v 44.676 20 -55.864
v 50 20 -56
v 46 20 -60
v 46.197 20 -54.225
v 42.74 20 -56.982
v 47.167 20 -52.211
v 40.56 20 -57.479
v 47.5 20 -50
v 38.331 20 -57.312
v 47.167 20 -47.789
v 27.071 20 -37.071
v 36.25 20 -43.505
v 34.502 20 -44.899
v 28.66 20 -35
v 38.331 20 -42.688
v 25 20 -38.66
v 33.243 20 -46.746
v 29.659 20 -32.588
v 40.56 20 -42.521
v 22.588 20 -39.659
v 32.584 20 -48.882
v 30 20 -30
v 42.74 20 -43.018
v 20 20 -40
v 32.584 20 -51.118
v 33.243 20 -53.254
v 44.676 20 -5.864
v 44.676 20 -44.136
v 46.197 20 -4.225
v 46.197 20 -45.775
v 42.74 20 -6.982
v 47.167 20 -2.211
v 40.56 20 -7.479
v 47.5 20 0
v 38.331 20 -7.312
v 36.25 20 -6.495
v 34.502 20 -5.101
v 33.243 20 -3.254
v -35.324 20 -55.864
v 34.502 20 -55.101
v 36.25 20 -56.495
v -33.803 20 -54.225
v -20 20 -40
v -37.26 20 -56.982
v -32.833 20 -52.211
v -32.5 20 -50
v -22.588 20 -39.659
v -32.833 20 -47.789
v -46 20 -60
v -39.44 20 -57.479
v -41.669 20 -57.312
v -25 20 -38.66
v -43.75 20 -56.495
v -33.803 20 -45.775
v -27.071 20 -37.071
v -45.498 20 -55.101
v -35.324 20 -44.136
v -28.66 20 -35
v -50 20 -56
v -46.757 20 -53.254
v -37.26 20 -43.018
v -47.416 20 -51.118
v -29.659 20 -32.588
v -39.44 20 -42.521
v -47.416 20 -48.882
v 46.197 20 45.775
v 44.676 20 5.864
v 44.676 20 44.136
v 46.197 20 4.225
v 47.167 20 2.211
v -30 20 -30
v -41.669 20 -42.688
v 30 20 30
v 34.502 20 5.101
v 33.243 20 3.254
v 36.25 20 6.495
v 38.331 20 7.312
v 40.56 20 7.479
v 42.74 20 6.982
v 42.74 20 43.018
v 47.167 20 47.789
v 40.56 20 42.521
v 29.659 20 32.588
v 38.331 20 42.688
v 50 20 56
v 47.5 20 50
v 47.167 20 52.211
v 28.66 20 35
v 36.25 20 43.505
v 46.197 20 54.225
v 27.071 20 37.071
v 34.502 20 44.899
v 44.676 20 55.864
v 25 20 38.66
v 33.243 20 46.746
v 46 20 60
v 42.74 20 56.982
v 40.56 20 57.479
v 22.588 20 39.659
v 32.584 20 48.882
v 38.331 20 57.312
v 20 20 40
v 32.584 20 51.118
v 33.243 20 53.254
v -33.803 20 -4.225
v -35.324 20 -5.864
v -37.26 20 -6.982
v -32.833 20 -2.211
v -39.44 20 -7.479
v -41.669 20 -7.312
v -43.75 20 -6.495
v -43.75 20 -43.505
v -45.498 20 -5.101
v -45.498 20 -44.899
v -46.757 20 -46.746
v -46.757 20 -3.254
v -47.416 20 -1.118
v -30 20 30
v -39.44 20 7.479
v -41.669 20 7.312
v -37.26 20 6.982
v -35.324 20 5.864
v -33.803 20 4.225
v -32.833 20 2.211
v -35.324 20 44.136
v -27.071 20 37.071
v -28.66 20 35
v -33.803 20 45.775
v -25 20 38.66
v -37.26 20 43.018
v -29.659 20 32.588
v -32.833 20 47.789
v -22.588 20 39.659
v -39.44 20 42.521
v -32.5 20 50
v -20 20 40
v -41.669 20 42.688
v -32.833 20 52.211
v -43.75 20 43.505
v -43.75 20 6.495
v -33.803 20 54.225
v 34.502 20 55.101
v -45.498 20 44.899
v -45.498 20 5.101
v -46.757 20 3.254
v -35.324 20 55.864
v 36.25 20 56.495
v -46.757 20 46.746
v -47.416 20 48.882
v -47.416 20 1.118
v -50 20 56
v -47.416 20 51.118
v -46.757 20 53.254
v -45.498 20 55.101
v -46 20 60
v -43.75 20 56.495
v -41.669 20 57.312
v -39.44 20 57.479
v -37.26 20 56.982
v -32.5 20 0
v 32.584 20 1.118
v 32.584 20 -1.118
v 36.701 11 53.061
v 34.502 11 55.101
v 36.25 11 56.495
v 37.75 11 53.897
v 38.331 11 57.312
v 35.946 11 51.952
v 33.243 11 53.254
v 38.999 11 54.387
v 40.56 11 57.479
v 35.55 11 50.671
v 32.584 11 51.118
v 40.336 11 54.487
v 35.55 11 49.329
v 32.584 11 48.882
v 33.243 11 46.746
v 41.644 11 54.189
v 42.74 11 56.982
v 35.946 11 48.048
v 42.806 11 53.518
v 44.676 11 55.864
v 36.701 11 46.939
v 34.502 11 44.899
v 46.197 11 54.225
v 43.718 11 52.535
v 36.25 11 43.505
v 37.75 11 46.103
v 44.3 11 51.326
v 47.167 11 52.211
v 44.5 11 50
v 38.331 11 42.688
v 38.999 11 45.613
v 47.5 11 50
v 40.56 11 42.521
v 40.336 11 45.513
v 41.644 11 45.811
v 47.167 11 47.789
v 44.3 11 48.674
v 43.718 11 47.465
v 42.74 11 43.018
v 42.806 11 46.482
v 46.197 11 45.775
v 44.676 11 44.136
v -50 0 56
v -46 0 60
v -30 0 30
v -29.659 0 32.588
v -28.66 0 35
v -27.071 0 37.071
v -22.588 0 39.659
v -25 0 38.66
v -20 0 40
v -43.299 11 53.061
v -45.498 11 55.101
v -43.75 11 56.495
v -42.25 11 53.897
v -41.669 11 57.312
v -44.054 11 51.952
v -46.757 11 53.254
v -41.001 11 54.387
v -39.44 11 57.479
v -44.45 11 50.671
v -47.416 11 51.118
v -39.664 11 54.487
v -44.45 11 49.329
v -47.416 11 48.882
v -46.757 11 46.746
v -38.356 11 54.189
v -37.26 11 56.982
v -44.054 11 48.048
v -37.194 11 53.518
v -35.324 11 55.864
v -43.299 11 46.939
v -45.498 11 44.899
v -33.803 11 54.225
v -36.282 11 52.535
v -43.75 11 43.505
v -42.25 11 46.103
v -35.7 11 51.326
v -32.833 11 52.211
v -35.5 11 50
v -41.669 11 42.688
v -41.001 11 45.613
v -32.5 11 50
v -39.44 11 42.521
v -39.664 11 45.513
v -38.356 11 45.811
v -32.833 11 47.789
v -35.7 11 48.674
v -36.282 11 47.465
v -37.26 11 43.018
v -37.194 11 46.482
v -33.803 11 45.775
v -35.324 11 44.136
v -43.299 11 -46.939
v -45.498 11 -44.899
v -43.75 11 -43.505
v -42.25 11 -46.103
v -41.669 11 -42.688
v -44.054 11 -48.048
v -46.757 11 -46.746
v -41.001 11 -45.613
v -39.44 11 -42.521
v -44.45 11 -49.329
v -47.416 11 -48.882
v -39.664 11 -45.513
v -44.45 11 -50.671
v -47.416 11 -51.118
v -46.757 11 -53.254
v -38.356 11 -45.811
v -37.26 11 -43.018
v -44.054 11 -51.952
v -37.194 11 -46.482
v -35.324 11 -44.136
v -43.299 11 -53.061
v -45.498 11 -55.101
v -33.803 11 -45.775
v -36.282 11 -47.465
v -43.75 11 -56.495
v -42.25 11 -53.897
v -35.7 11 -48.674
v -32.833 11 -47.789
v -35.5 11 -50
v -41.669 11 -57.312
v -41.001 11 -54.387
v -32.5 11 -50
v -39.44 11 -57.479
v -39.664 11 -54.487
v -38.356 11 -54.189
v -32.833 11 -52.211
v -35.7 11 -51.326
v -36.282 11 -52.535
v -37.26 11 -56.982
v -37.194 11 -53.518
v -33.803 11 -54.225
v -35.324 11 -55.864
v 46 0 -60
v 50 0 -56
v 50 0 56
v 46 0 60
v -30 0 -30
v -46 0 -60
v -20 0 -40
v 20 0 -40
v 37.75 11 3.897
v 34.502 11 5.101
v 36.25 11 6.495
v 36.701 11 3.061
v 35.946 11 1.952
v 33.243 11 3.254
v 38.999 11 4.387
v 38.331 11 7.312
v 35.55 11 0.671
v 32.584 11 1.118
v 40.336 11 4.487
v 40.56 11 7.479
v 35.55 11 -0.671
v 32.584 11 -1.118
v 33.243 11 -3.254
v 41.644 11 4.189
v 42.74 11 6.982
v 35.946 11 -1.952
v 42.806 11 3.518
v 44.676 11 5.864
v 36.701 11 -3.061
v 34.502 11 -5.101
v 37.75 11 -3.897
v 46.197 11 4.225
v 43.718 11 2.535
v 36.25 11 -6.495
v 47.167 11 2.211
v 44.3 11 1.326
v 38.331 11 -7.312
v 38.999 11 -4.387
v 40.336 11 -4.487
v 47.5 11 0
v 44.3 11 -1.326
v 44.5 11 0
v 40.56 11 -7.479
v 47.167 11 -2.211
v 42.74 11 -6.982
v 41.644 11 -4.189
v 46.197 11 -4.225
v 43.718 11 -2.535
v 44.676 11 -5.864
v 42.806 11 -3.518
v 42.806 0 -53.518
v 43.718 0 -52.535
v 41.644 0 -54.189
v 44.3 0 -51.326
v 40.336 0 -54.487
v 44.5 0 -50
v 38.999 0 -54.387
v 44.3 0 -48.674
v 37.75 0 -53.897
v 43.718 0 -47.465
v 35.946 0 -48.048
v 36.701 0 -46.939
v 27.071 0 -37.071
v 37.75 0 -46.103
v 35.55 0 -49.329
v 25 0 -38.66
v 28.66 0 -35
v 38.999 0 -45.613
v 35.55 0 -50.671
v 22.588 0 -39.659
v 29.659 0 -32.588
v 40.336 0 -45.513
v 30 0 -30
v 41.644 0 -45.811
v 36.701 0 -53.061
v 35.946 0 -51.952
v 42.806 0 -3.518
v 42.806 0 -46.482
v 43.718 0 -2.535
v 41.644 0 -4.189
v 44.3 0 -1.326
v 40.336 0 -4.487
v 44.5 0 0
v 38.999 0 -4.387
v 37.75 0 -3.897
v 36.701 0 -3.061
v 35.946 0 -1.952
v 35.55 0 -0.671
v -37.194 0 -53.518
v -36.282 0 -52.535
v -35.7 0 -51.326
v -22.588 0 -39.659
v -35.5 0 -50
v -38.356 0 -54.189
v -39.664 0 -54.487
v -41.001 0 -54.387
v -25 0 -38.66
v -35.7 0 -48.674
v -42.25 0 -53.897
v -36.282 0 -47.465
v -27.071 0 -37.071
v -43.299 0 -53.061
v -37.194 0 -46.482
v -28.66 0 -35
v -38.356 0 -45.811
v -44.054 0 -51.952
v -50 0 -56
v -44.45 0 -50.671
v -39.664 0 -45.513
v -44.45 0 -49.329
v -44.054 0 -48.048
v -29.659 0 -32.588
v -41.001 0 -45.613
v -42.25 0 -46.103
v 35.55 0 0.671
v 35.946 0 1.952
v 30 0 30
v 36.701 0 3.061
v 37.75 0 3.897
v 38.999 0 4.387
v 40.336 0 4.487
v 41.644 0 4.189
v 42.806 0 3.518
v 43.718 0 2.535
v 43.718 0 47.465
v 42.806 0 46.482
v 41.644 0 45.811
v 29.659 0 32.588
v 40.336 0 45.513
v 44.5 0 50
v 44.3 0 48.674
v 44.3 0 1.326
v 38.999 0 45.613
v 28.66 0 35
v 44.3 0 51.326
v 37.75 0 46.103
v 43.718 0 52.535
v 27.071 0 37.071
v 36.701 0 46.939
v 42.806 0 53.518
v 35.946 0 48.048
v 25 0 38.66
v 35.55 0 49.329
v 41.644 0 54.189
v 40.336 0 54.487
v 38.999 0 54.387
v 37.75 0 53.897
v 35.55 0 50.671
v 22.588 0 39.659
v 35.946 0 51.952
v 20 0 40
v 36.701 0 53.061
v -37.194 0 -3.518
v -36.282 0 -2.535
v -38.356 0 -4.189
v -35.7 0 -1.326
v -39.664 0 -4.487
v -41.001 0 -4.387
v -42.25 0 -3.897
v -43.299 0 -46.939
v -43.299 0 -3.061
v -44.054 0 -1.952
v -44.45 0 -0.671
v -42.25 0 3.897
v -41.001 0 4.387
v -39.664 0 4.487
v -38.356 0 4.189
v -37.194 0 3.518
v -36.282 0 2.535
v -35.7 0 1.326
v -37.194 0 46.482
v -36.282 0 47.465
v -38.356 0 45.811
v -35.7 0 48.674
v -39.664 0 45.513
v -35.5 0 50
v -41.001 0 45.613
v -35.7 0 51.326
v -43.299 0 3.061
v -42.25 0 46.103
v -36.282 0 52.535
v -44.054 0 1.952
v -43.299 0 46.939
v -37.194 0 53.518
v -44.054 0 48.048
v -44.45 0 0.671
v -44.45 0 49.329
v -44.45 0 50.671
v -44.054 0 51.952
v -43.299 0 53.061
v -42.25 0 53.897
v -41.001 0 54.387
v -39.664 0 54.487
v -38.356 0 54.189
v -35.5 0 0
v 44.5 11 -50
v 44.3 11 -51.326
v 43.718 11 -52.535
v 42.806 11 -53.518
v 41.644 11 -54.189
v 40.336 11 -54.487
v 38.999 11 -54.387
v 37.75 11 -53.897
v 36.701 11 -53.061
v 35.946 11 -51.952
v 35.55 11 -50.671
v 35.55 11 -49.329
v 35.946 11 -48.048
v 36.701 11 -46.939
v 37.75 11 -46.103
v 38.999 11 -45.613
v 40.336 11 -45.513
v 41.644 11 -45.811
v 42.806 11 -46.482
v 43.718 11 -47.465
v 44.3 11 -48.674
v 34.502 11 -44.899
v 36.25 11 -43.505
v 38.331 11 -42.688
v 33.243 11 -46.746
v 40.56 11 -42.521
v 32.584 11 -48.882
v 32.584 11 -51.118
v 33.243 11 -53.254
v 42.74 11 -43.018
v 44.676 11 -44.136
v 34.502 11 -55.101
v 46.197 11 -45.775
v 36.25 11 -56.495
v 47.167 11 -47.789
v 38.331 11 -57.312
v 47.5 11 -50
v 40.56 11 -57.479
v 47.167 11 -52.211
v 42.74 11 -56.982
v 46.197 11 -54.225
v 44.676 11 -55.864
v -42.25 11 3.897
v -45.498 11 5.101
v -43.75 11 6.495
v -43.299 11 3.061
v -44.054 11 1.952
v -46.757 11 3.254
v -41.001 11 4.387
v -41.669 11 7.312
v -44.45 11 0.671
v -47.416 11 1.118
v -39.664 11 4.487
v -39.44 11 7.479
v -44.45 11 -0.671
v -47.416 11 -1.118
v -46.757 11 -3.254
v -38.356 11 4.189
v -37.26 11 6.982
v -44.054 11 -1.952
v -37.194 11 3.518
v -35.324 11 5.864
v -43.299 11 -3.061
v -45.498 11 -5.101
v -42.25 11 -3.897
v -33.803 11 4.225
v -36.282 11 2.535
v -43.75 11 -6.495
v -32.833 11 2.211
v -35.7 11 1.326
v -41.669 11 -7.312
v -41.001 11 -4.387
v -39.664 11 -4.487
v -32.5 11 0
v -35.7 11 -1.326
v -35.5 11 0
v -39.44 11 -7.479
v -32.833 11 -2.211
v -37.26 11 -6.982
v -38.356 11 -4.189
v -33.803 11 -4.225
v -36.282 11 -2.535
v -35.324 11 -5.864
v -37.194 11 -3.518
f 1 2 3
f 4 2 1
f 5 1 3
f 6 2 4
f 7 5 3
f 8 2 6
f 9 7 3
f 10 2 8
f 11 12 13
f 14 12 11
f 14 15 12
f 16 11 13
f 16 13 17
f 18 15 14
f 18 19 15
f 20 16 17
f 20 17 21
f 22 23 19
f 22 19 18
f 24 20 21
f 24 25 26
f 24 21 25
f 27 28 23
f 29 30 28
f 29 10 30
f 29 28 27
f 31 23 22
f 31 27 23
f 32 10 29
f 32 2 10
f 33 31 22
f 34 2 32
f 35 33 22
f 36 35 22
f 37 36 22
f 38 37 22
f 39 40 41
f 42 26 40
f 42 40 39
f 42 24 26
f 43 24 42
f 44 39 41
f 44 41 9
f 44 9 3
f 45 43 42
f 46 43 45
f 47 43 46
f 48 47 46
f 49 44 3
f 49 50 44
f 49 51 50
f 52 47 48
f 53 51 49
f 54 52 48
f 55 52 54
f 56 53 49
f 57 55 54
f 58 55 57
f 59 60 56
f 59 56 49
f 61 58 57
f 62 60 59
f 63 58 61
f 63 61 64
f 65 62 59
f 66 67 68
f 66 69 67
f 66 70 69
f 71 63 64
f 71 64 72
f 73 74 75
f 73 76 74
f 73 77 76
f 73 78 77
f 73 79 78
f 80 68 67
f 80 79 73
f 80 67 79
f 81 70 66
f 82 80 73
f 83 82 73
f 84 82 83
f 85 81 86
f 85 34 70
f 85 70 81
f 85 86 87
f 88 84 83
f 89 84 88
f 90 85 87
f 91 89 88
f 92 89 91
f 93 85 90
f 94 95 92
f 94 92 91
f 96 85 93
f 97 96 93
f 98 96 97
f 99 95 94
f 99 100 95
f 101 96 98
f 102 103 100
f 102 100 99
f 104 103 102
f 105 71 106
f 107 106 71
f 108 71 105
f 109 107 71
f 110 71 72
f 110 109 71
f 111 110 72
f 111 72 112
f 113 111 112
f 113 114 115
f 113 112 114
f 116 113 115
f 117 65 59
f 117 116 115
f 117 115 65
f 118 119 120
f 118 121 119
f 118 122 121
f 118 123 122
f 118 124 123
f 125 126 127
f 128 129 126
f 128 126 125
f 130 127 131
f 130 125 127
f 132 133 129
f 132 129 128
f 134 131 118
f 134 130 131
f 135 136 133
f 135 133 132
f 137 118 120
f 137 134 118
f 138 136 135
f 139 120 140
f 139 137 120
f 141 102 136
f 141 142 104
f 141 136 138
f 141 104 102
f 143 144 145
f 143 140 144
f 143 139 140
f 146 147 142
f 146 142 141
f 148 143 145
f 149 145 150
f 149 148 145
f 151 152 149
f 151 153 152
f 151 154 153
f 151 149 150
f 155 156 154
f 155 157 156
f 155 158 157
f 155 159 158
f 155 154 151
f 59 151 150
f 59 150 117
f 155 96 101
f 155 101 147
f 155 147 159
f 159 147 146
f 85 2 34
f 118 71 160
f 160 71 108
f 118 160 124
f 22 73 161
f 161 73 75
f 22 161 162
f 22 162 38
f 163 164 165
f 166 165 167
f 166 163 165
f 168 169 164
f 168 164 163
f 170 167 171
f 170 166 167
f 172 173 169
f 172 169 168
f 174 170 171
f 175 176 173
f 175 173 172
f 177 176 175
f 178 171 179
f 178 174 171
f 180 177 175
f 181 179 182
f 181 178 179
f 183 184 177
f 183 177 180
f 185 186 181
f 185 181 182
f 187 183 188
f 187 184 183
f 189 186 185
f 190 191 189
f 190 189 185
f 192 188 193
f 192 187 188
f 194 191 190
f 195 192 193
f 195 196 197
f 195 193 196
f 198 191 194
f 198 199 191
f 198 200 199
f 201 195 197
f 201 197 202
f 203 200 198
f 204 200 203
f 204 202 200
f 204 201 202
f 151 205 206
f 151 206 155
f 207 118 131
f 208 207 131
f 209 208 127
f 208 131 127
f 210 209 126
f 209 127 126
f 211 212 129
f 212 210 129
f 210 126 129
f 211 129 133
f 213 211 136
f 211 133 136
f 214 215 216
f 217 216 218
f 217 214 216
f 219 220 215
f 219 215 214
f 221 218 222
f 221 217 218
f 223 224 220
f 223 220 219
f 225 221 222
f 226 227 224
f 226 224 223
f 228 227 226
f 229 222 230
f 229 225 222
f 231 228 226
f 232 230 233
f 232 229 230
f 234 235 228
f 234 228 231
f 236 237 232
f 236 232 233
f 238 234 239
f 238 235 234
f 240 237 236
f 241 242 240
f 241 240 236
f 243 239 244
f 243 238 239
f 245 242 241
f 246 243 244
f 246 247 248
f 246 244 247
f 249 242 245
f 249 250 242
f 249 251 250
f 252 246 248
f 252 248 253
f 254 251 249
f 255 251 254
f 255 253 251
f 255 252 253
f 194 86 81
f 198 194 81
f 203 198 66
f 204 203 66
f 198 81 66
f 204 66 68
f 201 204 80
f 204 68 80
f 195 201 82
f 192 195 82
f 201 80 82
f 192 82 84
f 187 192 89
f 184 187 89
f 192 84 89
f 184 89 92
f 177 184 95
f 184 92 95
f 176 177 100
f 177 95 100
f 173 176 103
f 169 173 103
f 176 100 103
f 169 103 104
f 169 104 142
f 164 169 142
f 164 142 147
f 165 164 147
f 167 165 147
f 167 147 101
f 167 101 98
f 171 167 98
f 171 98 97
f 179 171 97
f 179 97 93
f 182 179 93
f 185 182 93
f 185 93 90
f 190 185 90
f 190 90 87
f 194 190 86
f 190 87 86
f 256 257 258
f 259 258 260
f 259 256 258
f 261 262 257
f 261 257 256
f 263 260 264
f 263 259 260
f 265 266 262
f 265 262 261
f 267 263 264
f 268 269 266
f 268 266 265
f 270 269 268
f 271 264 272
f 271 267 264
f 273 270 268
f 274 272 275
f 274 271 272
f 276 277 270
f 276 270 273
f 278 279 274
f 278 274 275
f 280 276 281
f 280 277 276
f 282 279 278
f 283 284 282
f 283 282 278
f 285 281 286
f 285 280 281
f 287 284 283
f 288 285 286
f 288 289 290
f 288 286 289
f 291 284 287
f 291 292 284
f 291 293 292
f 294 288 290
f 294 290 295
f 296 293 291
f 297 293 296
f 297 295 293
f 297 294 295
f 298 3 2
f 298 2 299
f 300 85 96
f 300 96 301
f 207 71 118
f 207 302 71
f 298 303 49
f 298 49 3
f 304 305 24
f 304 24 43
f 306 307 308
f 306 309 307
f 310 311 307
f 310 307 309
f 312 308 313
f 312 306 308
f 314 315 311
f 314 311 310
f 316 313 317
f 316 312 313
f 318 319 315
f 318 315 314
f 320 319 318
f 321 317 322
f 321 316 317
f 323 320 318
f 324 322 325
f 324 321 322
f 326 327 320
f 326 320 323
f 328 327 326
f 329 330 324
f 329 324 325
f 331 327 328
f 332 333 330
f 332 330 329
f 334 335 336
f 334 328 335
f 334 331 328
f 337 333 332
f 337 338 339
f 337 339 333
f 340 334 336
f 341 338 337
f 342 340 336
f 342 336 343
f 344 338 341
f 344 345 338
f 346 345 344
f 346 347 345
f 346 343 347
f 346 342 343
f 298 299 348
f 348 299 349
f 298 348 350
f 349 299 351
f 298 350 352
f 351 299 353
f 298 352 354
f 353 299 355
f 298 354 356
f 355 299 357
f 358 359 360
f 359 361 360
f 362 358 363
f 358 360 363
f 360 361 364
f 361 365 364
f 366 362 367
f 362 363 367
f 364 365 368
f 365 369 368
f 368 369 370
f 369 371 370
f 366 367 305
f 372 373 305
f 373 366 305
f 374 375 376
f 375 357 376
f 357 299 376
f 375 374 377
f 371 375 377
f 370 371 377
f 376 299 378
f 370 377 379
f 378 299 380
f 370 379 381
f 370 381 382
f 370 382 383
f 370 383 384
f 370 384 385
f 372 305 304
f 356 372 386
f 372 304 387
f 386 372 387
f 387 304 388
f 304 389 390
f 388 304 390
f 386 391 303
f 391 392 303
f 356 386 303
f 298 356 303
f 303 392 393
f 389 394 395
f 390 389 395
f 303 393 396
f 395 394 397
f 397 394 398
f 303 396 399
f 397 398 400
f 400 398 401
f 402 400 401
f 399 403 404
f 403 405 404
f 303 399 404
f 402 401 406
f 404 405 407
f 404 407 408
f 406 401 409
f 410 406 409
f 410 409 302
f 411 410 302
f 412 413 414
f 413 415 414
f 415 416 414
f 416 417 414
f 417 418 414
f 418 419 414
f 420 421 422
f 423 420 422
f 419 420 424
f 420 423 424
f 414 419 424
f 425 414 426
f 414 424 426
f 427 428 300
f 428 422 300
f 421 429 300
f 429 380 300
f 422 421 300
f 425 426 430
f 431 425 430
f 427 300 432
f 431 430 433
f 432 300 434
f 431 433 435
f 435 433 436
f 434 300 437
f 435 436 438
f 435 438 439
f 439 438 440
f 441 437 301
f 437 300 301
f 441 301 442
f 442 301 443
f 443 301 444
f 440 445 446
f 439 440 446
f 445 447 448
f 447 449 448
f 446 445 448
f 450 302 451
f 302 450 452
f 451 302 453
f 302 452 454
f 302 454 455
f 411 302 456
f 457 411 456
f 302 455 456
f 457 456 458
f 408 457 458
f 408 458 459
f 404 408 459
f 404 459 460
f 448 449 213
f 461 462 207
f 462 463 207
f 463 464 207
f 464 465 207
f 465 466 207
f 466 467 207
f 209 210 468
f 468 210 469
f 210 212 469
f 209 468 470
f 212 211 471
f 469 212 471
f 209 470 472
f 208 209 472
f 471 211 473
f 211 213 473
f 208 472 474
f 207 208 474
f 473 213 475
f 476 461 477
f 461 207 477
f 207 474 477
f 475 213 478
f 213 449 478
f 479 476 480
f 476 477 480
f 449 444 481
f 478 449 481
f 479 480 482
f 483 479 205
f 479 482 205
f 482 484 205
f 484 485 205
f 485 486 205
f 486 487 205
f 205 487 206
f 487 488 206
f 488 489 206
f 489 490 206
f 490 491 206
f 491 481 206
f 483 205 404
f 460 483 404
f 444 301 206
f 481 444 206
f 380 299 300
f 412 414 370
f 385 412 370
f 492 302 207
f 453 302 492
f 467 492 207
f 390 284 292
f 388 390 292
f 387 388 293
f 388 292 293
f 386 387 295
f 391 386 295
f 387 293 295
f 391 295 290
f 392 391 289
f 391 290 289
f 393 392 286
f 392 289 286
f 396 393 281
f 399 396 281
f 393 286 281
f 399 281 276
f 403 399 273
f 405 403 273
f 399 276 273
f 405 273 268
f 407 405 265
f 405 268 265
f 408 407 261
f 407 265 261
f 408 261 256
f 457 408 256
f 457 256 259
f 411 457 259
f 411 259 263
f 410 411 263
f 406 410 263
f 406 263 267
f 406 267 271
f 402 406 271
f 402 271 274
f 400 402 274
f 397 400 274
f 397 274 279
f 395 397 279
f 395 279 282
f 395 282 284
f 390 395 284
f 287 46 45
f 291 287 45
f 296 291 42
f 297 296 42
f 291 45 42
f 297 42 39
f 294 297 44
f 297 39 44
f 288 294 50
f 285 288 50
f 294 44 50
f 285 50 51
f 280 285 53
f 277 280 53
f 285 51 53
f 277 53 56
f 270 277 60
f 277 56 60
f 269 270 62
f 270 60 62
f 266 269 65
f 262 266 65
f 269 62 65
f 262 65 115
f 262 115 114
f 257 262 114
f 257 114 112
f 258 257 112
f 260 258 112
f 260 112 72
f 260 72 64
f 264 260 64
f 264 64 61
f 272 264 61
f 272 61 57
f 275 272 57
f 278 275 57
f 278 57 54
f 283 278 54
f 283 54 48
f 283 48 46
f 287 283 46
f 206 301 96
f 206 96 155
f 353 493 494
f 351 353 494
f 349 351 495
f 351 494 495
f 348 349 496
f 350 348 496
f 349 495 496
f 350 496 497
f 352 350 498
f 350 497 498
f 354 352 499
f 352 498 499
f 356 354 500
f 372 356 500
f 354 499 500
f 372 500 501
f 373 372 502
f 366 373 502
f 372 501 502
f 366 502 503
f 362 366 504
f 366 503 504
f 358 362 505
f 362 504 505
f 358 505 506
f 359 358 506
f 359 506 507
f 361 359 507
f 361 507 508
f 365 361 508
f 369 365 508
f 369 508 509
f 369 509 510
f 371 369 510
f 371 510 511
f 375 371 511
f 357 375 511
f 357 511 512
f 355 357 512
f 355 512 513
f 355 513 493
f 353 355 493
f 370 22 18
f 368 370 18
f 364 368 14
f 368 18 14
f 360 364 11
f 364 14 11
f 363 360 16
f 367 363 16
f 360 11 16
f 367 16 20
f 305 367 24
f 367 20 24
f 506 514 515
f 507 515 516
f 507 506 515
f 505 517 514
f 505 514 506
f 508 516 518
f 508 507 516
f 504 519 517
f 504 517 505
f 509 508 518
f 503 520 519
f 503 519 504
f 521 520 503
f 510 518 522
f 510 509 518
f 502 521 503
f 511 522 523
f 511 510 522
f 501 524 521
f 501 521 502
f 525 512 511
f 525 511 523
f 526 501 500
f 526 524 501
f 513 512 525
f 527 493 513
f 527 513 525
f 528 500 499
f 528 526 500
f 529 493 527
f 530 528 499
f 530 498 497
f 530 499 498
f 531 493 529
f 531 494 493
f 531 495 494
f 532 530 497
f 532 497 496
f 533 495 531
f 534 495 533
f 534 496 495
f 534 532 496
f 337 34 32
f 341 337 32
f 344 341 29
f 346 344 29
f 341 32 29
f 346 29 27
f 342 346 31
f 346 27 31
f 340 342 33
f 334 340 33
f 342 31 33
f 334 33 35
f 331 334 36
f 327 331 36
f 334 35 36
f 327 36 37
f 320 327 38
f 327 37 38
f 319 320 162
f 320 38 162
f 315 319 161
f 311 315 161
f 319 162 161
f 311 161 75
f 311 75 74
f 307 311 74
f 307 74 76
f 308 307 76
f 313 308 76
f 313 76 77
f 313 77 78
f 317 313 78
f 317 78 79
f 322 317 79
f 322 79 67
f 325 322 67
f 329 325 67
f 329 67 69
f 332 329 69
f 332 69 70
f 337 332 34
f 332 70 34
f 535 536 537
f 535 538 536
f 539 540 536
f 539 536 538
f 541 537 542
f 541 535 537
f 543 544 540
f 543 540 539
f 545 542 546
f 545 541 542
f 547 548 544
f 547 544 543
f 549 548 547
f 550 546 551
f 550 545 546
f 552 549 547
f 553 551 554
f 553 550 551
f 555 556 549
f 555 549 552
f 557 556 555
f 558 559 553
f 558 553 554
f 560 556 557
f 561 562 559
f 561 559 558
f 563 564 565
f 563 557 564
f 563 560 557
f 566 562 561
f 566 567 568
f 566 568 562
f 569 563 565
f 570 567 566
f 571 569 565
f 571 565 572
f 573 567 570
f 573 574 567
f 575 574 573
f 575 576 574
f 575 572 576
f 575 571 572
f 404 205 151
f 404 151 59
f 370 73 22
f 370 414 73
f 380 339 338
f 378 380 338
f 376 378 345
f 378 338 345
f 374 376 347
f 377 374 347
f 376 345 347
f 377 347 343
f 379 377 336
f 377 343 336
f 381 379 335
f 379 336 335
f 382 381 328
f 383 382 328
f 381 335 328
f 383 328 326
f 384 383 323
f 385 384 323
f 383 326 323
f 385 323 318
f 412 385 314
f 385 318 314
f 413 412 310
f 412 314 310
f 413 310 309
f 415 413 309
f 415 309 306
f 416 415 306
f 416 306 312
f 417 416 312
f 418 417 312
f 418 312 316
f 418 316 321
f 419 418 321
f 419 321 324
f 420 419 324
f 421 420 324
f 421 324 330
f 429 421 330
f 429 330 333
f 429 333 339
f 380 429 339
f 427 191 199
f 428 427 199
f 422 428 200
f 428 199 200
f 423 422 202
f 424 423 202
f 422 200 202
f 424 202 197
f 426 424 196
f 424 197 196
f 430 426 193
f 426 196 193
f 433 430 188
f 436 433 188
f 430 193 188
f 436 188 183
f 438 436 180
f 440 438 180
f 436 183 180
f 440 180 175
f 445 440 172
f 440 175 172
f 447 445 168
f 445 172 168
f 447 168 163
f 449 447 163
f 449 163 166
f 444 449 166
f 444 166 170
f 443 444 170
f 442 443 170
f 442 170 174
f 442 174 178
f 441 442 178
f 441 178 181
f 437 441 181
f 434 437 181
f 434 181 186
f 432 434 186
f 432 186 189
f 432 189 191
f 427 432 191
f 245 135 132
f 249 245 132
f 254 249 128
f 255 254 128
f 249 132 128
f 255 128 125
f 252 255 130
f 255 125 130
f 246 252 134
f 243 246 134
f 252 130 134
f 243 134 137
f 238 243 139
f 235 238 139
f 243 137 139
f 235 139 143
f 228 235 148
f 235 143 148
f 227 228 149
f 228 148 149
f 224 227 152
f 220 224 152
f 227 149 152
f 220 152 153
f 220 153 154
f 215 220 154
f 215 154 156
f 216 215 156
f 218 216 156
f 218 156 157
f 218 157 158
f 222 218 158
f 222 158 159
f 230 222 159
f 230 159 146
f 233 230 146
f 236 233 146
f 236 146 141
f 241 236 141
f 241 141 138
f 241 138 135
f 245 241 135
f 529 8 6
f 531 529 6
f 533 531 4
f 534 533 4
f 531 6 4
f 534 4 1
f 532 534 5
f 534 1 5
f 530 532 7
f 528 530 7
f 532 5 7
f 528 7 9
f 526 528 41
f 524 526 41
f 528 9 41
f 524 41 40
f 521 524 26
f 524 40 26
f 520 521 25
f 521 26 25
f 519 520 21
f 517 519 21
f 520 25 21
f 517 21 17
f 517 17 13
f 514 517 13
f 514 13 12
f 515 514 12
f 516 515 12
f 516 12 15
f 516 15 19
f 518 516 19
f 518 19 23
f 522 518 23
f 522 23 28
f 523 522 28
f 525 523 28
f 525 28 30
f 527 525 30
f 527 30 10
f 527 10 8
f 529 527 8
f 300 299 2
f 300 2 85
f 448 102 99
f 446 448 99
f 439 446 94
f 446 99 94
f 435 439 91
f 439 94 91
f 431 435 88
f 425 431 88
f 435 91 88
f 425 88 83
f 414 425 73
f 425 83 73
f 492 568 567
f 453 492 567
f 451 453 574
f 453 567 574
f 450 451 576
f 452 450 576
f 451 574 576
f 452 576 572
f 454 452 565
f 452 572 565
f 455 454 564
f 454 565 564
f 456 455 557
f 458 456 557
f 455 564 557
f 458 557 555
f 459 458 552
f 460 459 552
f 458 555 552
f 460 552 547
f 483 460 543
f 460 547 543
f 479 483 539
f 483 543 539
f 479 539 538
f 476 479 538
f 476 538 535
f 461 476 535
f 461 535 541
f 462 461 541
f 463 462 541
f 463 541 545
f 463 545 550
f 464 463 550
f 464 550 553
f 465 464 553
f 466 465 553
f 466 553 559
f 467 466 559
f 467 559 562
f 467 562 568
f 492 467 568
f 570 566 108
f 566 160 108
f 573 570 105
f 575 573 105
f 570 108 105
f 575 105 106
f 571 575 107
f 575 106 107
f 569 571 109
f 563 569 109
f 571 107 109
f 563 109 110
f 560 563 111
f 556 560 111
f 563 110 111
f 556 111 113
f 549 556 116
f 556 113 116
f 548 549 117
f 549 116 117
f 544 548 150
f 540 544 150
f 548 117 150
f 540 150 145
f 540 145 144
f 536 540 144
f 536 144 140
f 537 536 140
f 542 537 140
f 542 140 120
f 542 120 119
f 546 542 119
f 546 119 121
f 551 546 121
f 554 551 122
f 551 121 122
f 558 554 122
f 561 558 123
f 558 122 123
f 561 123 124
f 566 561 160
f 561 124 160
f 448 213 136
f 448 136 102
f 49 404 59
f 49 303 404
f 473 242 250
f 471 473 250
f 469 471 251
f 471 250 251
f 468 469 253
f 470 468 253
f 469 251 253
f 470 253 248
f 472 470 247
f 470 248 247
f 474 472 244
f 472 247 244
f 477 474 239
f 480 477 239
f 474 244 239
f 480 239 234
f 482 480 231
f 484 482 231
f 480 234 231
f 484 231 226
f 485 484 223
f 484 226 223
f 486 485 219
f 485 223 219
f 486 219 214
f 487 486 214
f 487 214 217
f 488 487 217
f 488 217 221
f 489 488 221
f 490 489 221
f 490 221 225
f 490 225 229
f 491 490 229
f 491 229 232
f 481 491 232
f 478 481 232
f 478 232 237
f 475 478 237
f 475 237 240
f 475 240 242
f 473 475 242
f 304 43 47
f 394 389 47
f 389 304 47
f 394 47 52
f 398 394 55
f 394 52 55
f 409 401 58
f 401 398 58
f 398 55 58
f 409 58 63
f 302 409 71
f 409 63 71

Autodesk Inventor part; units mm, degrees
ref_plane "YZ Plane" through (0, 0, 0) normal (1, 0, 0) x (0, 1, 0)
ref_plane "XZ Plane" through (0, 0, 0) normal (0, 1, 0) x (-1, 0, 0)
ref_plane "XY Plane" through (0, 0, 0) normal (0, 0, 1) x (1, 0, 0)
sketch "Sketch1" plane through (0, 0, 0) normal (0, 1, 0) x (-1, 0, 0)
  line L0 (-50, 60) -> (50, 60)
  line L1 (50, 60) -> (50, -60)
  line L2 (50, -60) -> (-50, -60)
  line L3 (-50, -60) -> (-50, 60)
  line L4 (-50, 60) -> (50, -60) construction
  line L5 (50, 60) -> (-50, -60) construction
  line L6 (30, 40) -> (-30, 40)
  line L7 (-30, 40) -> (-30, -40)
  line L8 (-30, -40) -> (30, -40)
  line L9 (30, -40) -> (30, 40)
  line L10 (30, 40) -> (-30, -40) construction
  line L11 (-30, 40) -> (30, -40) construction
  point P0 (0, 0)
  dimension "d0" = 100
  dimension "d1" = 120
  dimension "d2" = 60
  dimension "d3" = 80
extrude "Extrusion1" add sketch "Sketch1" along normal blind 20
sketch "Sketch2" plane through (0, 20, 0) normal (0, 1, 0) x (1, 0, 0)
  circle A0 centre (-40, 50) radius 4.5
  line L0 (-50, 60) -> (-50, -60) projected
  circle A1 centre (-40, 0) radius 4.5
  circle A2 centre (-40, -50) radius 4.5
  line L1 (0, -4.5) -> (0, 7.1494) construction
  circle A3 centre (40, 50) radius 4.5
  circle A4 centre (40, 0) radius 4.5
  circle A5 centre (40, -50) radius 4.5
  point P0 (0, 0)
  dimension "d6" = 9
  dimension "d7" = 10
  dimension "d8" = 50
  dimension "d9" = 9
  dimension "d10" = 9
  dimension "d11" = 50
extrude "Extrusion2" cut sketch "Sketch2" against normal through all
sketch "Sketch3" plane through (0, 20, 0) normal (0, 1, 0) x (1, 0, 0)
  circle A0 centre (-40, 50) radius 4.5 projected
  circle A1 centre (-40, 50) radius 7.5
  circle A2 centre (-40, 0) radius 4.5 projected
  circle A3 centre (-40, 0) radius 7.5
  circle A4 centre (-40, -50) radius 4.5 projected
  circle A5 centre (-40, -50) radius 7.5
  circle A6 centre (40, -50) radius 4.5 projected
  circle A7 centre (40, -50) radius 7.5
  circle A8 centre (40, 0) radius 4.5 projected
  circle A9 centre (40, 0) radius 7.5
  circle A10 centre (40, 50) radius 4.5 projected
  circle A11 centre (40, 50) radius 7.5
  point P0 (0, 0)
  dimension "d14" = 15
  dimension "d15" = 15
  dimension "d16" = 15
  dimension "d17" = 15
  dimension "d18" = 15
  dimension "d19" = 15
extrude "Extrusion3" cut sketch "Sketch3" against normal blind 9
fillet "Fillet1" radius 10 4 edges at (-30, 10, -40) (-30, 10, 40) (30, 10, 40) (30, 10, -40)
chamfer "Chamfer1" distance 4 angle 45 4 edges at (50, 10, 60) (-50, 10, 60) (-50, 10, -60) (50, 10, -60)
properties part number "peca3"
